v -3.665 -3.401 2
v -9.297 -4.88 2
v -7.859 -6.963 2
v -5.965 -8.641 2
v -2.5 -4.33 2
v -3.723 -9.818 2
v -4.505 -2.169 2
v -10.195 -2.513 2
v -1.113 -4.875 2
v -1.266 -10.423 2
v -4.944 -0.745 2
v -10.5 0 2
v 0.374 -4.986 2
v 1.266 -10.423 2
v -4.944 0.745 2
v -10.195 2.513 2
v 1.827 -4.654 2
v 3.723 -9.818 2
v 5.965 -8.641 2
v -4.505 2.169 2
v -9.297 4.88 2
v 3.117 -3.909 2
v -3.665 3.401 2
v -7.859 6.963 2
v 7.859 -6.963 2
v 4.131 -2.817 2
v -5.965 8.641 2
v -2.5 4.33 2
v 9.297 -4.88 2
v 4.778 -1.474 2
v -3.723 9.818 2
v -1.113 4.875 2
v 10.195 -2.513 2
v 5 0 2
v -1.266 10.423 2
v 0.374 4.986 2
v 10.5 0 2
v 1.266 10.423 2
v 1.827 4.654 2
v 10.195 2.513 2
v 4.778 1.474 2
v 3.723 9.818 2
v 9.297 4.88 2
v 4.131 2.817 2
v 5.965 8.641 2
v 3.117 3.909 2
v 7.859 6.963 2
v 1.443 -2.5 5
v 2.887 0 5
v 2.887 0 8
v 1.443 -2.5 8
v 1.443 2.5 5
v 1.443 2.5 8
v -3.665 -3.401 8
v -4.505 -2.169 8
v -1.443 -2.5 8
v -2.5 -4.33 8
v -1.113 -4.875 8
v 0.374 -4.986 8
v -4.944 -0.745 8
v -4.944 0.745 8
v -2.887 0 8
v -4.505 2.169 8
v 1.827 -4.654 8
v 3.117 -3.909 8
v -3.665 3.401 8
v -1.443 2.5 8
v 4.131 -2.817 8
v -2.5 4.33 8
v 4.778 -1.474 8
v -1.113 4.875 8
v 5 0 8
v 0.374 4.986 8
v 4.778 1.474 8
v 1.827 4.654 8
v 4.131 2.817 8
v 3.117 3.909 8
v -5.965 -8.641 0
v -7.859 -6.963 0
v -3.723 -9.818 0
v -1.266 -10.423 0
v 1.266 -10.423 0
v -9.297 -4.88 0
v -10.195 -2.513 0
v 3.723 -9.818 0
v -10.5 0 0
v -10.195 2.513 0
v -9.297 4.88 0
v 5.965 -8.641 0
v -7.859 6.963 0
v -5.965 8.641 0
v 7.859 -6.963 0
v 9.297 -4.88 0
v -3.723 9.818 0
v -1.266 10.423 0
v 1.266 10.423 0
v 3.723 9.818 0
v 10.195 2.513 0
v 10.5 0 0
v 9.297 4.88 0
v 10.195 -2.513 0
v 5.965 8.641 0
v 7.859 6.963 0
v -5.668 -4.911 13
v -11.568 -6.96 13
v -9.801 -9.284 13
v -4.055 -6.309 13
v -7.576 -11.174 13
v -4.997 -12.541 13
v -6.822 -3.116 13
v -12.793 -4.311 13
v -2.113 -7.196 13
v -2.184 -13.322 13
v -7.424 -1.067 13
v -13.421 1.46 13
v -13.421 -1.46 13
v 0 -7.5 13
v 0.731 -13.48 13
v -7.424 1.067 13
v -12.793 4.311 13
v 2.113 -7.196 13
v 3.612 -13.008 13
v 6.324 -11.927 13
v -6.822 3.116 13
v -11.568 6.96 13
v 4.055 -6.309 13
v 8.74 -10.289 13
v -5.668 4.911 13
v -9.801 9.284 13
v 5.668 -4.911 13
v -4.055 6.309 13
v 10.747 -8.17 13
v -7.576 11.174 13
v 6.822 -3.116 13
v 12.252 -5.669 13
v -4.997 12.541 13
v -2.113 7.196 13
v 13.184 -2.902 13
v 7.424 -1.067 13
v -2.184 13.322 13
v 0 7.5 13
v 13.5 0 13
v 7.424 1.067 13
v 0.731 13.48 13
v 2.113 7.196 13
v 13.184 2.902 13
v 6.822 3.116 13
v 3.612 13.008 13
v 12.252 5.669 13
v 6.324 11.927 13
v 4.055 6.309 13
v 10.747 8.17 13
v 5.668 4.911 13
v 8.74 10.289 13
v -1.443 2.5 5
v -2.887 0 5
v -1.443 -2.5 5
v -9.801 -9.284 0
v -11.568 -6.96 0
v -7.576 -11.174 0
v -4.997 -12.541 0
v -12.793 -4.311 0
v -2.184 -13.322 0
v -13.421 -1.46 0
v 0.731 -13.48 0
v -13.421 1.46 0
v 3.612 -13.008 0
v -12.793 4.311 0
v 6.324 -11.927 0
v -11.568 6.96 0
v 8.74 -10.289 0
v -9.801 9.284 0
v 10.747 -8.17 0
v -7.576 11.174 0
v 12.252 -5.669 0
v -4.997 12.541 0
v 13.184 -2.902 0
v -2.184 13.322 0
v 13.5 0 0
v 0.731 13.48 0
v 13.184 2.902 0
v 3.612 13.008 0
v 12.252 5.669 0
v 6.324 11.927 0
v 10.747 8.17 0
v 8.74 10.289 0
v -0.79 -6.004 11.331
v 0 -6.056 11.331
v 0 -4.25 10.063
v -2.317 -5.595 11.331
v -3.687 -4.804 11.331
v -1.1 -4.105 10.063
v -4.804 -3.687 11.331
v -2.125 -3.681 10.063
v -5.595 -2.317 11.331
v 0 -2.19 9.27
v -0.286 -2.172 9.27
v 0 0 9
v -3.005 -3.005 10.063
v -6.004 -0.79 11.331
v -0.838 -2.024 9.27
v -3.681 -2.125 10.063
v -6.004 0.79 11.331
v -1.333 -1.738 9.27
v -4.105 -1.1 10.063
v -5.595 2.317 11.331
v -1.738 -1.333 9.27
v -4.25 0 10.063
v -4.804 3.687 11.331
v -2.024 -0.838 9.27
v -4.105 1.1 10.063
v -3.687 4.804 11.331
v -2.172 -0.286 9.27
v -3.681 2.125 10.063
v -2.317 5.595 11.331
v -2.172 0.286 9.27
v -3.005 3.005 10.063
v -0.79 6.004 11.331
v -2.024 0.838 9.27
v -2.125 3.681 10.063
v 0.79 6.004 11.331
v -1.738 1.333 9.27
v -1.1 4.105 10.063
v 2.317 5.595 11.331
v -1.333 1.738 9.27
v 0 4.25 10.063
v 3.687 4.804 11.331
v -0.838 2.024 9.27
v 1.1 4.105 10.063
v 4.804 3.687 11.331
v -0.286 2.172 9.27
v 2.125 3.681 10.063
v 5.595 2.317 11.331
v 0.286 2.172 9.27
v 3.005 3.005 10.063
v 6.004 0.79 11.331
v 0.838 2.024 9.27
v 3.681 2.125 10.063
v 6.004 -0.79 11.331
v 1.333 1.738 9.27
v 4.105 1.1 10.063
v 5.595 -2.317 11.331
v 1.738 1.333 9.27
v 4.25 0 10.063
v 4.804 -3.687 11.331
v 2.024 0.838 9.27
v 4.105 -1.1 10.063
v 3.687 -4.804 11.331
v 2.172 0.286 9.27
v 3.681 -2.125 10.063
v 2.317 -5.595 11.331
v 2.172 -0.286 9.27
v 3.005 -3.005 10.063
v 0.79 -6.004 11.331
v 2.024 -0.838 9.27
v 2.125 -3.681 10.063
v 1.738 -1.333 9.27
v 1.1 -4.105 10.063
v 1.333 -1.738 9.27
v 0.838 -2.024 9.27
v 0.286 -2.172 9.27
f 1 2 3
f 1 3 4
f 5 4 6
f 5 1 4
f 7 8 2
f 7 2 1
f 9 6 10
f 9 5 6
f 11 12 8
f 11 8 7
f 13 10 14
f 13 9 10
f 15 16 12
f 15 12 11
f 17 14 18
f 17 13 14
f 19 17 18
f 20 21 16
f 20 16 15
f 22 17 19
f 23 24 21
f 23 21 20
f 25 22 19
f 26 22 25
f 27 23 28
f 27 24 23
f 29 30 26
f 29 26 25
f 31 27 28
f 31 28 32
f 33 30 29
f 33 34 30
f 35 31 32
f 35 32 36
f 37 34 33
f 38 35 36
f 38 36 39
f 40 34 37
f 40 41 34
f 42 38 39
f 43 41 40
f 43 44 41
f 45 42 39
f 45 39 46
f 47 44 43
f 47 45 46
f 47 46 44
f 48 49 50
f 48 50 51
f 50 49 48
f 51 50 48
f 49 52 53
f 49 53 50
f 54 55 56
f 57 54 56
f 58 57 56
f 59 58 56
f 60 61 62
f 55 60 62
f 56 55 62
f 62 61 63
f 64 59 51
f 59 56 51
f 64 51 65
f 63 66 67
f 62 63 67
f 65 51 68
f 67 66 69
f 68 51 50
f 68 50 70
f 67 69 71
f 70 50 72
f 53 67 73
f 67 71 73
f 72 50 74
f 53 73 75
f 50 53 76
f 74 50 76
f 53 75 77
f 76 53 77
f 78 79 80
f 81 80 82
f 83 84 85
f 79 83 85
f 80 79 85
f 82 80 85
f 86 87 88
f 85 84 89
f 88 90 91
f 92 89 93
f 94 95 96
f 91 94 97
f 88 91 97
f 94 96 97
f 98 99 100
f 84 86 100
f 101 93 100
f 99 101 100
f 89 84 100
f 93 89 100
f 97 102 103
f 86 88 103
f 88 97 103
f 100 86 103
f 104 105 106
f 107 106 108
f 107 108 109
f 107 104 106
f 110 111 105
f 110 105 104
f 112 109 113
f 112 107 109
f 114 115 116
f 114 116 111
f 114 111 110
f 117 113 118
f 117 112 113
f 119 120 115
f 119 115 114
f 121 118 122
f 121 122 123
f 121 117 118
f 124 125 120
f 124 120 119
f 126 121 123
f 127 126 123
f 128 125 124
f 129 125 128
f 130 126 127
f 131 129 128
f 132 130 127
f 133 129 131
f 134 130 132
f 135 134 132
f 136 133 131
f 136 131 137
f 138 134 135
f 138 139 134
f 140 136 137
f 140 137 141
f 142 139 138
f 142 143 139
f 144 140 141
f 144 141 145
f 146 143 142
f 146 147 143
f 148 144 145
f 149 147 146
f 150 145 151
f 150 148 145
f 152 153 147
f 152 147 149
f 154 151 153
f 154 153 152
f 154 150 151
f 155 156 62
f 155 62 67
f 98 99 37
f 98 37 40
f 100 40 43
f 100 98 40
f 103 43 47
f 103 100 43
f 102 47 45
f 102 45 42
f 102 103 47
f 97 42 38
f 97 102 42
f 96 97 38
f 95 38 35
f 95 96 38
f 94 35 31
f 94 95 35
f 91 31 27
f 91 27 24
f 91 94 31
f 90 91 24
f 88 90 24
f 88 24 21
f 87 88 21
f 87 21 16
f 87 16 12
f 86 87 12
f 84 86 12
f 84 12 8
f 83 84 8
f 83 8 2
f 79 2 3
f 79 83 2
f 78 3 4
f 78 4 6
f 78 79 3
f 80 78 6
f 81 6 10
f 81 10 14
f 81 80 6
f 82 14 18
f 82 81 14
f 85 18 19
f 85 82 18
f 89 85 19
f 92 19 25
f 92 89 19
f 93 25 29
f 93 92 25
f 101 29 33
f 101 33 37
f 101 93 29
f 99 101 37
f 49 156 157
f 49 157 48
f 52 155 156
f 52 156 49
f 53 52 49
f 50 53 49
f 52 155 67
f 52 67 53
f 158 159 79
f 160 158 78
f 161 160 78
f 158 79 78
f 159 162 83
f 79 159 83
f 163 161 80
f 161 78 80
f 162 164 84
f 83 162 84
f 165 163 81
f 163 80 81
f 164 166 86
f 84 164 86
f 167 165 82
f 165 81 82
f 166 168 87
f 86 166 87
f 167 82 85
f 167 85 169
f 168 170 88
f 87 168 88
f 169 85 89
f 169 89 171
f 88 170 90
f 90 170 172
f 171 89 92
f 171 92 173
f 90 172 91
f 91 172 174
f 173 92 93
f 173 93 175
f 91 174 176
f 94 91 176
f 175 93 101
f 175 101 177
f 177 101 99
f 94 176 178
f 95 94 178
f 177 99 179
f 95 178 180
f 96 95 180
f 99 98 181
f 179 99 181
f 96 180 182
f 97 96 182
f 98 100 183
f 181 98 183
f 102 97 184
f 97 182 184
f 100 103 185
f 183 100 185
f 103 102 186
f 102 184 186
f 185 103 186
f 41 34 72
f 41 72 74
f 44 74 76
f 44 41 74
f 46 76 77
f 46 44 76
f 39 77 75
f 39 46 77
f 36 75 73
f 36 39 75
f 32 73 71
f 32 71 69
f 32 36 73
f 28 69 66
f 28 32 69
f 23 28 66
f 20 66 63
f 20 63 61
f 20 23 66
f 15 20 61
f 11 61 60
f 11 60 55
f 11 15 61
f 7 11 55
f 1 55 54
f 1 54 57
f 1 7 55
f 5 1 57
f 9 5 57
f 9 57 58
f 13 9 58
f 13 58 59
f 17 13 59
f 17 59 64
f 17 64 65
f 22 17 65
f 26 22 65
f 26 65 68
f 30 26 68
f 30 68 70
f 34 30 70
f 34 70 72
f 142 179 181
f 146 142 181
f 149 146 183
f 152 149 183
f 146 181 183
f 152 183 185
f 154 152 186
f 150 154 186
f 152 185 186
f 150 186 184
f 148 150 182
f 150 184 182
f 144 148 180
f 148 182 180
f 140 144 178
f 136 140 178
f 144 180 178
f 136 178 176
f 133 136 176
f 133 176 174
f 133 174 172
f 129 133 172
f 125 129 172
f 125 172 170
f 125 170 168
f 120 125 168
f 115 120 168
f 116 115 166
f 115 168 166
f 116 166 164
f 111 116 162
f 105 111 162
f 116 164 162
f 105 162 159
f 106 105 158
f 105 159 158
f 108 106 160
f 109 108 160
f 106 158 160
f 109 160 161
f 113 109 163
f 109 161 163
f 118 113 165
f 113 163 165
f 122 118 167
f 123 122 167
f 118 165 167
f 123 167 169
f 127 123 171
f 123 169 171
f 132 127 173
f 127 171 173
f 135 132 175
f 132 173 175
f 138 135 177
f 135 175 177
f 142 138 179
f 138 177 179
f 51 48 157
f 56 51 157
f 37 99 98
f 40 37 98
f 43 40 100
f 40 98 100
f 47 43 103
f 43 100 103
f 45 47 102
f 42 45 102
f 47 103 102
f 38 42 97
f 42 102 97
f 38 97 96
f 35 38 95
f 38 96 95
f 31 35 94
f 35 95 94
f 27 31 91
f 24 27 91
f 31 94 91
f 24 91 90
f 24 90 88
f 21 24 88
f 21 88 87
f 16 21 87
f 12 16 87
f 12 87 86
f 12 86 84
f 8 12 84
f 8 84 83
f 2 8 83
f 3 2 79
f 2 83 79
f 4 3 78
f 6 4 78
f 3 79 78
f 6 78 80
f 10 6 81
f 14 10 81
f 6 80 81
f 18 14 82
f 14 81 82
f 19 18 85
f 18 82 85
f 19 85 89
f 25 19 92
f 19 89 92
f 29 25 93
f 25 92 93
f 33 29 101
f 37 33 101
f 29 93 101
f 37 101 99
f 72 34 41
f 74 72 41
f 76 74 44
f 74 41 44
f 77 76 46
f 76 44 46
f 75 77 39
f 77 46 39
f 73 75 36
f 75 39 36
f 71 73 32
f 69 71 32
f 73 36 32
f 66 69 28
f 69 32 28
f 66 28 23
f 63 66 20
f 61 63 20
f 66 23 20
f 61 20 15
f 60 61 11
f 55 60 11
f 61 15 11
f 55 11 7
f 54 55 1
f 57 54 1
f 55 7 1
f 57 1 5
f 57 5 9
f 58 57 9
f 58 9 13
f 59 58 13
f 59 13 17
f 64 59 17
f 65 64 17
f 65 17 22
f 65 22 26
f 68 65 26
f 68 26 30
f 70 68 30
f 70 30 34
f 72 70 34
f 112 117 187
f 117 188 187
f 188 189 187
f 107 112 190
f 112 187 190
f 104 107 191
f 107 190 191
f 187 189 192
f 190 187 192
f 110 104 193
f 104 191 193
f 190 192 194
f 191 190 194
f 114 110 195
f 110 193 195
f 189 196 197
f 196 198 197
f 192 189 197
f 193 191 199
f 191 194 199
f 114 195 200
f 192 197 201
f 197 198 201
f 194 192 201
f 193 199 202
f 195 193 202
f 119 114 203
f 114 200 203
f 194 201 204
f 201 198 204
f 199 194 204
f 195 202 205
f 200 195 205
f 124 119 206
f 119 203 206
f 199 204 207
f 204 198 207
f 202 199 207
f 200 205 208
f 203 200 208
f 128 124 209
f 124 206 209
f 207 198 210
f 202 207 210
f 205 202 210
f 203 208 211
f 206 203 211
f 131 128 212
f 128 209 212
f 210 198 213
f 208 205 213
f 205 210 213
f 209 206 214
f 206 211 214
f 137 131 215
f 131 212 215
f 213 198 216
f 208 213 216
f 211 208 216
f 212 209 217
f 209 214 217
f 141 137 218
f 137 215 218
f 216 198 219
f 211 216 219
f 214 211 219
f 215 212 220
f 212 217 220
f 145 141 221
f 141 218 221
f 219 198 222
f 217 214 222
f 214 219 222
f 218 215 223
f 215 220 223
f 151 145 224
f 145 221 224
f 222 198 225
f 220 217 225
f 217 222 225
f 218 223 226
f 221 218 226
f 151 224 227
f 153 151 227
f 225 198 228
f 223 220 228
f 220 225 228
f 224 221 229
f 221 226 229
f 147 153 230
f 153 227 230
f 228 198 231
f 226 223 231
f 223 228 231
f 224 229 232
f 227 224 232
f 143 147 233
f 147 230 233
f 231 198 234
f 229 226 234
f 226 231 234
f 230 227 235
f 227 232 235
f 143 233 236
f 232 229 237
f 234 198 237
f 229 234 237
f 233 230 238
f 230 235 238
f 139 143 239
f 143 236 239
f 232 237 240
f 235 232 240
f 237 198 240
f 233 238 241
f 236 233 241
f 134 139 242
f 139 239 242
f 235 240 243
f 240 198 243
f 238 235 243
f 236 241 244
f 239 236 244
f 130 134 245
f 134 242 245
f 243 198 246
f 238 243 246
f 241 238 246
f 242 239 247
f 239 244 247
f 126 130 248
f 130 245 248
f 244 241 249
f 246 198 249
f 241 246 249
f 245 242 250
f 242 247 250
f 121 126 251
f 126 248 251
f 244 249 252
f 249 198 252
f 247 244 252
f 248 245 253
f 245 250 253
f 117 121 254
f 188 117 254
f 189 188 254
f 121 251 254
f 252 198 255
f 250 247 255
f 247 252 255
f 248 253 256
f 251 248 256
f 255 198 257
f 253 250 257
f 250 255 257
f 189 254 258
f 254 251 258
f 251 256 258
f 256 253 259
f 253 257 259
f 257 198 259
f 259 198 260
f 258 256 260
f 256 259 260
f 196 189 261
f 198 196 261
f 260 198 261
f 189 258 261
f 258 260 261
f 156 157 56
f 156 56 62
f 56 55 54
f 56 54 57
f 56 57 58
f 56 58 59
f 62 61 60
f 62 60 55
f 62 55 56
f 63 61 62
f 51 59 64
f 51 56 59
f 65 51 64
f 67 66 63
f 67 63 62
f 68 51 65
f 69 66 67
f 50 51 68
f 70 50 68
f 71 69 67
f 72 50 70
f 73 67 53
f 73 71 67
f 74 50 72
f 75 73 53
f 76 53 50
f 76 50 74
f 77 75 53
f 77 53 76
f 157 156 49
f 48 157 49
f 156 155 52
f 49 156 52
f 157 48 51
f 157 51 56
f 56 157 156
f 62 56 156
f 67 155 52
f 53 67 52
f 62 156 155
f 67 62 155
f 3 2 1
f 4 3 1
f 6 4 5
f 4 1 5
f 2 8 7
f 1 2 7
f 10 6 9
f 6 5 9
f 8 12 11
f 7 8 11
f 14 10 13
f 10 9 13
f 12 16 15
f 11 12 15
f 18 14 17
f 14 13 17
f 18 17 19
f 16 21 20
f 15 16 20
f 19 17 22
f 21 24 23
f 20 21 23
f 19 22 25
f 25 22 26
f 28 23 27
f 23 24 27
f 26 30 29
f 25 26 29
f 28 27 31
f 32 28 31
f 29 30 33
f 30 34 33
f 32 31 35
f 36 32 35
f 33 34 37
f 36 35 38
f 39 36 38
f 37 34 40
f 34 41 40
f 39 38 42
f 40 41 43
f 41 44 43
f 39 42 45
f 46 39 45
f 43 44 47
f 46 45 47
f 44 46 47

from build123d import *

# Parameters (mm, degrees)
F0_R     = 10.5
F0_R_2   = 5
F1_DEPTH = 2
F2_DEPTH = 8
F3_DEPTH = 5
F4_R     = 13.5
F5_DEPTH = 13


with BuildPart() as f1:
    # F0 (on Top) → F1 (new body)
    with BuildSketch(Plane.XY):
        Circle(F0_R)
        Circle(F0_R_2, mode=Mode.SUBTRACT)
        Circle(F0_R_2)
        Polygon((-2.8867513459, 0), (-1.443375673, 2.5), (1.443375673, 2.5), (2.8867513459, 0), (1.443375673, -2.5), (-1.443375673, -2.5), align=None, mode=Mode.SUBTRACT)
        Polygon((1.443375673, 2.5), (-1.443375673, 2.5), (-2.8867513459, 0), (-1.443375673, -2.5), (1.443375673, -2.5), (2.8867513459, 0), align=None)
    extrude(amount=F1_DEPTH)

    # F0 (on Top) → F2 (join)
    with BuildSketch(Plane.XY):
        Circle(F0_R_2)
        Polygon((-2.8867513459, 0), (-1.443375673, 2.5), (1.443375673, 2.5), (2.8867513459, 0), (1.443375673, -2.5), (-1.443375673, -2.5), align=None, mode=Mode.SUBTRACT)
    extrude(amount=F2_DEPTH)

    # F0 (on Top) → F3 (join)
    with BuildSketch(Plane.XY):
        Polygon((1.443375673, 2.5), (-1.443375673, 2.5), (-2.8867513459, 0), (-1.443375673, -2.5), (1.443375673, -2.5), (2.8867513459, 0), align=None)
    extrude(amount=F3_DEPTH)


with BuildPart() as f5:
    # F4 (on Top) → F5 (new body)
    with BuildSketch(Plane.XY):
        Circle(F4_R)
    extrude(amount=F5_DEPTH)

    # F6: cut F1
    add(f1.part, mode=Mode.SUBTRACT)

    # F7 (on Right) → F8 (revolve, cut)
    with BuildSketch(Plane.YZ):
        with BuildLine():
            Line((0, 9), (0, 13))
            Line((0, 13), (-7.5, 13))
            ThreePointArc((-7.5, 13), (-4.25, 10.0625), (0, 9))
        make_face()
    revolve(axis=Axis((0, 0, 13.9612619239), (0, 0, -1)), mode=Mode.SUBTRACT)


solid = Compound([f1.part, f5.part])
